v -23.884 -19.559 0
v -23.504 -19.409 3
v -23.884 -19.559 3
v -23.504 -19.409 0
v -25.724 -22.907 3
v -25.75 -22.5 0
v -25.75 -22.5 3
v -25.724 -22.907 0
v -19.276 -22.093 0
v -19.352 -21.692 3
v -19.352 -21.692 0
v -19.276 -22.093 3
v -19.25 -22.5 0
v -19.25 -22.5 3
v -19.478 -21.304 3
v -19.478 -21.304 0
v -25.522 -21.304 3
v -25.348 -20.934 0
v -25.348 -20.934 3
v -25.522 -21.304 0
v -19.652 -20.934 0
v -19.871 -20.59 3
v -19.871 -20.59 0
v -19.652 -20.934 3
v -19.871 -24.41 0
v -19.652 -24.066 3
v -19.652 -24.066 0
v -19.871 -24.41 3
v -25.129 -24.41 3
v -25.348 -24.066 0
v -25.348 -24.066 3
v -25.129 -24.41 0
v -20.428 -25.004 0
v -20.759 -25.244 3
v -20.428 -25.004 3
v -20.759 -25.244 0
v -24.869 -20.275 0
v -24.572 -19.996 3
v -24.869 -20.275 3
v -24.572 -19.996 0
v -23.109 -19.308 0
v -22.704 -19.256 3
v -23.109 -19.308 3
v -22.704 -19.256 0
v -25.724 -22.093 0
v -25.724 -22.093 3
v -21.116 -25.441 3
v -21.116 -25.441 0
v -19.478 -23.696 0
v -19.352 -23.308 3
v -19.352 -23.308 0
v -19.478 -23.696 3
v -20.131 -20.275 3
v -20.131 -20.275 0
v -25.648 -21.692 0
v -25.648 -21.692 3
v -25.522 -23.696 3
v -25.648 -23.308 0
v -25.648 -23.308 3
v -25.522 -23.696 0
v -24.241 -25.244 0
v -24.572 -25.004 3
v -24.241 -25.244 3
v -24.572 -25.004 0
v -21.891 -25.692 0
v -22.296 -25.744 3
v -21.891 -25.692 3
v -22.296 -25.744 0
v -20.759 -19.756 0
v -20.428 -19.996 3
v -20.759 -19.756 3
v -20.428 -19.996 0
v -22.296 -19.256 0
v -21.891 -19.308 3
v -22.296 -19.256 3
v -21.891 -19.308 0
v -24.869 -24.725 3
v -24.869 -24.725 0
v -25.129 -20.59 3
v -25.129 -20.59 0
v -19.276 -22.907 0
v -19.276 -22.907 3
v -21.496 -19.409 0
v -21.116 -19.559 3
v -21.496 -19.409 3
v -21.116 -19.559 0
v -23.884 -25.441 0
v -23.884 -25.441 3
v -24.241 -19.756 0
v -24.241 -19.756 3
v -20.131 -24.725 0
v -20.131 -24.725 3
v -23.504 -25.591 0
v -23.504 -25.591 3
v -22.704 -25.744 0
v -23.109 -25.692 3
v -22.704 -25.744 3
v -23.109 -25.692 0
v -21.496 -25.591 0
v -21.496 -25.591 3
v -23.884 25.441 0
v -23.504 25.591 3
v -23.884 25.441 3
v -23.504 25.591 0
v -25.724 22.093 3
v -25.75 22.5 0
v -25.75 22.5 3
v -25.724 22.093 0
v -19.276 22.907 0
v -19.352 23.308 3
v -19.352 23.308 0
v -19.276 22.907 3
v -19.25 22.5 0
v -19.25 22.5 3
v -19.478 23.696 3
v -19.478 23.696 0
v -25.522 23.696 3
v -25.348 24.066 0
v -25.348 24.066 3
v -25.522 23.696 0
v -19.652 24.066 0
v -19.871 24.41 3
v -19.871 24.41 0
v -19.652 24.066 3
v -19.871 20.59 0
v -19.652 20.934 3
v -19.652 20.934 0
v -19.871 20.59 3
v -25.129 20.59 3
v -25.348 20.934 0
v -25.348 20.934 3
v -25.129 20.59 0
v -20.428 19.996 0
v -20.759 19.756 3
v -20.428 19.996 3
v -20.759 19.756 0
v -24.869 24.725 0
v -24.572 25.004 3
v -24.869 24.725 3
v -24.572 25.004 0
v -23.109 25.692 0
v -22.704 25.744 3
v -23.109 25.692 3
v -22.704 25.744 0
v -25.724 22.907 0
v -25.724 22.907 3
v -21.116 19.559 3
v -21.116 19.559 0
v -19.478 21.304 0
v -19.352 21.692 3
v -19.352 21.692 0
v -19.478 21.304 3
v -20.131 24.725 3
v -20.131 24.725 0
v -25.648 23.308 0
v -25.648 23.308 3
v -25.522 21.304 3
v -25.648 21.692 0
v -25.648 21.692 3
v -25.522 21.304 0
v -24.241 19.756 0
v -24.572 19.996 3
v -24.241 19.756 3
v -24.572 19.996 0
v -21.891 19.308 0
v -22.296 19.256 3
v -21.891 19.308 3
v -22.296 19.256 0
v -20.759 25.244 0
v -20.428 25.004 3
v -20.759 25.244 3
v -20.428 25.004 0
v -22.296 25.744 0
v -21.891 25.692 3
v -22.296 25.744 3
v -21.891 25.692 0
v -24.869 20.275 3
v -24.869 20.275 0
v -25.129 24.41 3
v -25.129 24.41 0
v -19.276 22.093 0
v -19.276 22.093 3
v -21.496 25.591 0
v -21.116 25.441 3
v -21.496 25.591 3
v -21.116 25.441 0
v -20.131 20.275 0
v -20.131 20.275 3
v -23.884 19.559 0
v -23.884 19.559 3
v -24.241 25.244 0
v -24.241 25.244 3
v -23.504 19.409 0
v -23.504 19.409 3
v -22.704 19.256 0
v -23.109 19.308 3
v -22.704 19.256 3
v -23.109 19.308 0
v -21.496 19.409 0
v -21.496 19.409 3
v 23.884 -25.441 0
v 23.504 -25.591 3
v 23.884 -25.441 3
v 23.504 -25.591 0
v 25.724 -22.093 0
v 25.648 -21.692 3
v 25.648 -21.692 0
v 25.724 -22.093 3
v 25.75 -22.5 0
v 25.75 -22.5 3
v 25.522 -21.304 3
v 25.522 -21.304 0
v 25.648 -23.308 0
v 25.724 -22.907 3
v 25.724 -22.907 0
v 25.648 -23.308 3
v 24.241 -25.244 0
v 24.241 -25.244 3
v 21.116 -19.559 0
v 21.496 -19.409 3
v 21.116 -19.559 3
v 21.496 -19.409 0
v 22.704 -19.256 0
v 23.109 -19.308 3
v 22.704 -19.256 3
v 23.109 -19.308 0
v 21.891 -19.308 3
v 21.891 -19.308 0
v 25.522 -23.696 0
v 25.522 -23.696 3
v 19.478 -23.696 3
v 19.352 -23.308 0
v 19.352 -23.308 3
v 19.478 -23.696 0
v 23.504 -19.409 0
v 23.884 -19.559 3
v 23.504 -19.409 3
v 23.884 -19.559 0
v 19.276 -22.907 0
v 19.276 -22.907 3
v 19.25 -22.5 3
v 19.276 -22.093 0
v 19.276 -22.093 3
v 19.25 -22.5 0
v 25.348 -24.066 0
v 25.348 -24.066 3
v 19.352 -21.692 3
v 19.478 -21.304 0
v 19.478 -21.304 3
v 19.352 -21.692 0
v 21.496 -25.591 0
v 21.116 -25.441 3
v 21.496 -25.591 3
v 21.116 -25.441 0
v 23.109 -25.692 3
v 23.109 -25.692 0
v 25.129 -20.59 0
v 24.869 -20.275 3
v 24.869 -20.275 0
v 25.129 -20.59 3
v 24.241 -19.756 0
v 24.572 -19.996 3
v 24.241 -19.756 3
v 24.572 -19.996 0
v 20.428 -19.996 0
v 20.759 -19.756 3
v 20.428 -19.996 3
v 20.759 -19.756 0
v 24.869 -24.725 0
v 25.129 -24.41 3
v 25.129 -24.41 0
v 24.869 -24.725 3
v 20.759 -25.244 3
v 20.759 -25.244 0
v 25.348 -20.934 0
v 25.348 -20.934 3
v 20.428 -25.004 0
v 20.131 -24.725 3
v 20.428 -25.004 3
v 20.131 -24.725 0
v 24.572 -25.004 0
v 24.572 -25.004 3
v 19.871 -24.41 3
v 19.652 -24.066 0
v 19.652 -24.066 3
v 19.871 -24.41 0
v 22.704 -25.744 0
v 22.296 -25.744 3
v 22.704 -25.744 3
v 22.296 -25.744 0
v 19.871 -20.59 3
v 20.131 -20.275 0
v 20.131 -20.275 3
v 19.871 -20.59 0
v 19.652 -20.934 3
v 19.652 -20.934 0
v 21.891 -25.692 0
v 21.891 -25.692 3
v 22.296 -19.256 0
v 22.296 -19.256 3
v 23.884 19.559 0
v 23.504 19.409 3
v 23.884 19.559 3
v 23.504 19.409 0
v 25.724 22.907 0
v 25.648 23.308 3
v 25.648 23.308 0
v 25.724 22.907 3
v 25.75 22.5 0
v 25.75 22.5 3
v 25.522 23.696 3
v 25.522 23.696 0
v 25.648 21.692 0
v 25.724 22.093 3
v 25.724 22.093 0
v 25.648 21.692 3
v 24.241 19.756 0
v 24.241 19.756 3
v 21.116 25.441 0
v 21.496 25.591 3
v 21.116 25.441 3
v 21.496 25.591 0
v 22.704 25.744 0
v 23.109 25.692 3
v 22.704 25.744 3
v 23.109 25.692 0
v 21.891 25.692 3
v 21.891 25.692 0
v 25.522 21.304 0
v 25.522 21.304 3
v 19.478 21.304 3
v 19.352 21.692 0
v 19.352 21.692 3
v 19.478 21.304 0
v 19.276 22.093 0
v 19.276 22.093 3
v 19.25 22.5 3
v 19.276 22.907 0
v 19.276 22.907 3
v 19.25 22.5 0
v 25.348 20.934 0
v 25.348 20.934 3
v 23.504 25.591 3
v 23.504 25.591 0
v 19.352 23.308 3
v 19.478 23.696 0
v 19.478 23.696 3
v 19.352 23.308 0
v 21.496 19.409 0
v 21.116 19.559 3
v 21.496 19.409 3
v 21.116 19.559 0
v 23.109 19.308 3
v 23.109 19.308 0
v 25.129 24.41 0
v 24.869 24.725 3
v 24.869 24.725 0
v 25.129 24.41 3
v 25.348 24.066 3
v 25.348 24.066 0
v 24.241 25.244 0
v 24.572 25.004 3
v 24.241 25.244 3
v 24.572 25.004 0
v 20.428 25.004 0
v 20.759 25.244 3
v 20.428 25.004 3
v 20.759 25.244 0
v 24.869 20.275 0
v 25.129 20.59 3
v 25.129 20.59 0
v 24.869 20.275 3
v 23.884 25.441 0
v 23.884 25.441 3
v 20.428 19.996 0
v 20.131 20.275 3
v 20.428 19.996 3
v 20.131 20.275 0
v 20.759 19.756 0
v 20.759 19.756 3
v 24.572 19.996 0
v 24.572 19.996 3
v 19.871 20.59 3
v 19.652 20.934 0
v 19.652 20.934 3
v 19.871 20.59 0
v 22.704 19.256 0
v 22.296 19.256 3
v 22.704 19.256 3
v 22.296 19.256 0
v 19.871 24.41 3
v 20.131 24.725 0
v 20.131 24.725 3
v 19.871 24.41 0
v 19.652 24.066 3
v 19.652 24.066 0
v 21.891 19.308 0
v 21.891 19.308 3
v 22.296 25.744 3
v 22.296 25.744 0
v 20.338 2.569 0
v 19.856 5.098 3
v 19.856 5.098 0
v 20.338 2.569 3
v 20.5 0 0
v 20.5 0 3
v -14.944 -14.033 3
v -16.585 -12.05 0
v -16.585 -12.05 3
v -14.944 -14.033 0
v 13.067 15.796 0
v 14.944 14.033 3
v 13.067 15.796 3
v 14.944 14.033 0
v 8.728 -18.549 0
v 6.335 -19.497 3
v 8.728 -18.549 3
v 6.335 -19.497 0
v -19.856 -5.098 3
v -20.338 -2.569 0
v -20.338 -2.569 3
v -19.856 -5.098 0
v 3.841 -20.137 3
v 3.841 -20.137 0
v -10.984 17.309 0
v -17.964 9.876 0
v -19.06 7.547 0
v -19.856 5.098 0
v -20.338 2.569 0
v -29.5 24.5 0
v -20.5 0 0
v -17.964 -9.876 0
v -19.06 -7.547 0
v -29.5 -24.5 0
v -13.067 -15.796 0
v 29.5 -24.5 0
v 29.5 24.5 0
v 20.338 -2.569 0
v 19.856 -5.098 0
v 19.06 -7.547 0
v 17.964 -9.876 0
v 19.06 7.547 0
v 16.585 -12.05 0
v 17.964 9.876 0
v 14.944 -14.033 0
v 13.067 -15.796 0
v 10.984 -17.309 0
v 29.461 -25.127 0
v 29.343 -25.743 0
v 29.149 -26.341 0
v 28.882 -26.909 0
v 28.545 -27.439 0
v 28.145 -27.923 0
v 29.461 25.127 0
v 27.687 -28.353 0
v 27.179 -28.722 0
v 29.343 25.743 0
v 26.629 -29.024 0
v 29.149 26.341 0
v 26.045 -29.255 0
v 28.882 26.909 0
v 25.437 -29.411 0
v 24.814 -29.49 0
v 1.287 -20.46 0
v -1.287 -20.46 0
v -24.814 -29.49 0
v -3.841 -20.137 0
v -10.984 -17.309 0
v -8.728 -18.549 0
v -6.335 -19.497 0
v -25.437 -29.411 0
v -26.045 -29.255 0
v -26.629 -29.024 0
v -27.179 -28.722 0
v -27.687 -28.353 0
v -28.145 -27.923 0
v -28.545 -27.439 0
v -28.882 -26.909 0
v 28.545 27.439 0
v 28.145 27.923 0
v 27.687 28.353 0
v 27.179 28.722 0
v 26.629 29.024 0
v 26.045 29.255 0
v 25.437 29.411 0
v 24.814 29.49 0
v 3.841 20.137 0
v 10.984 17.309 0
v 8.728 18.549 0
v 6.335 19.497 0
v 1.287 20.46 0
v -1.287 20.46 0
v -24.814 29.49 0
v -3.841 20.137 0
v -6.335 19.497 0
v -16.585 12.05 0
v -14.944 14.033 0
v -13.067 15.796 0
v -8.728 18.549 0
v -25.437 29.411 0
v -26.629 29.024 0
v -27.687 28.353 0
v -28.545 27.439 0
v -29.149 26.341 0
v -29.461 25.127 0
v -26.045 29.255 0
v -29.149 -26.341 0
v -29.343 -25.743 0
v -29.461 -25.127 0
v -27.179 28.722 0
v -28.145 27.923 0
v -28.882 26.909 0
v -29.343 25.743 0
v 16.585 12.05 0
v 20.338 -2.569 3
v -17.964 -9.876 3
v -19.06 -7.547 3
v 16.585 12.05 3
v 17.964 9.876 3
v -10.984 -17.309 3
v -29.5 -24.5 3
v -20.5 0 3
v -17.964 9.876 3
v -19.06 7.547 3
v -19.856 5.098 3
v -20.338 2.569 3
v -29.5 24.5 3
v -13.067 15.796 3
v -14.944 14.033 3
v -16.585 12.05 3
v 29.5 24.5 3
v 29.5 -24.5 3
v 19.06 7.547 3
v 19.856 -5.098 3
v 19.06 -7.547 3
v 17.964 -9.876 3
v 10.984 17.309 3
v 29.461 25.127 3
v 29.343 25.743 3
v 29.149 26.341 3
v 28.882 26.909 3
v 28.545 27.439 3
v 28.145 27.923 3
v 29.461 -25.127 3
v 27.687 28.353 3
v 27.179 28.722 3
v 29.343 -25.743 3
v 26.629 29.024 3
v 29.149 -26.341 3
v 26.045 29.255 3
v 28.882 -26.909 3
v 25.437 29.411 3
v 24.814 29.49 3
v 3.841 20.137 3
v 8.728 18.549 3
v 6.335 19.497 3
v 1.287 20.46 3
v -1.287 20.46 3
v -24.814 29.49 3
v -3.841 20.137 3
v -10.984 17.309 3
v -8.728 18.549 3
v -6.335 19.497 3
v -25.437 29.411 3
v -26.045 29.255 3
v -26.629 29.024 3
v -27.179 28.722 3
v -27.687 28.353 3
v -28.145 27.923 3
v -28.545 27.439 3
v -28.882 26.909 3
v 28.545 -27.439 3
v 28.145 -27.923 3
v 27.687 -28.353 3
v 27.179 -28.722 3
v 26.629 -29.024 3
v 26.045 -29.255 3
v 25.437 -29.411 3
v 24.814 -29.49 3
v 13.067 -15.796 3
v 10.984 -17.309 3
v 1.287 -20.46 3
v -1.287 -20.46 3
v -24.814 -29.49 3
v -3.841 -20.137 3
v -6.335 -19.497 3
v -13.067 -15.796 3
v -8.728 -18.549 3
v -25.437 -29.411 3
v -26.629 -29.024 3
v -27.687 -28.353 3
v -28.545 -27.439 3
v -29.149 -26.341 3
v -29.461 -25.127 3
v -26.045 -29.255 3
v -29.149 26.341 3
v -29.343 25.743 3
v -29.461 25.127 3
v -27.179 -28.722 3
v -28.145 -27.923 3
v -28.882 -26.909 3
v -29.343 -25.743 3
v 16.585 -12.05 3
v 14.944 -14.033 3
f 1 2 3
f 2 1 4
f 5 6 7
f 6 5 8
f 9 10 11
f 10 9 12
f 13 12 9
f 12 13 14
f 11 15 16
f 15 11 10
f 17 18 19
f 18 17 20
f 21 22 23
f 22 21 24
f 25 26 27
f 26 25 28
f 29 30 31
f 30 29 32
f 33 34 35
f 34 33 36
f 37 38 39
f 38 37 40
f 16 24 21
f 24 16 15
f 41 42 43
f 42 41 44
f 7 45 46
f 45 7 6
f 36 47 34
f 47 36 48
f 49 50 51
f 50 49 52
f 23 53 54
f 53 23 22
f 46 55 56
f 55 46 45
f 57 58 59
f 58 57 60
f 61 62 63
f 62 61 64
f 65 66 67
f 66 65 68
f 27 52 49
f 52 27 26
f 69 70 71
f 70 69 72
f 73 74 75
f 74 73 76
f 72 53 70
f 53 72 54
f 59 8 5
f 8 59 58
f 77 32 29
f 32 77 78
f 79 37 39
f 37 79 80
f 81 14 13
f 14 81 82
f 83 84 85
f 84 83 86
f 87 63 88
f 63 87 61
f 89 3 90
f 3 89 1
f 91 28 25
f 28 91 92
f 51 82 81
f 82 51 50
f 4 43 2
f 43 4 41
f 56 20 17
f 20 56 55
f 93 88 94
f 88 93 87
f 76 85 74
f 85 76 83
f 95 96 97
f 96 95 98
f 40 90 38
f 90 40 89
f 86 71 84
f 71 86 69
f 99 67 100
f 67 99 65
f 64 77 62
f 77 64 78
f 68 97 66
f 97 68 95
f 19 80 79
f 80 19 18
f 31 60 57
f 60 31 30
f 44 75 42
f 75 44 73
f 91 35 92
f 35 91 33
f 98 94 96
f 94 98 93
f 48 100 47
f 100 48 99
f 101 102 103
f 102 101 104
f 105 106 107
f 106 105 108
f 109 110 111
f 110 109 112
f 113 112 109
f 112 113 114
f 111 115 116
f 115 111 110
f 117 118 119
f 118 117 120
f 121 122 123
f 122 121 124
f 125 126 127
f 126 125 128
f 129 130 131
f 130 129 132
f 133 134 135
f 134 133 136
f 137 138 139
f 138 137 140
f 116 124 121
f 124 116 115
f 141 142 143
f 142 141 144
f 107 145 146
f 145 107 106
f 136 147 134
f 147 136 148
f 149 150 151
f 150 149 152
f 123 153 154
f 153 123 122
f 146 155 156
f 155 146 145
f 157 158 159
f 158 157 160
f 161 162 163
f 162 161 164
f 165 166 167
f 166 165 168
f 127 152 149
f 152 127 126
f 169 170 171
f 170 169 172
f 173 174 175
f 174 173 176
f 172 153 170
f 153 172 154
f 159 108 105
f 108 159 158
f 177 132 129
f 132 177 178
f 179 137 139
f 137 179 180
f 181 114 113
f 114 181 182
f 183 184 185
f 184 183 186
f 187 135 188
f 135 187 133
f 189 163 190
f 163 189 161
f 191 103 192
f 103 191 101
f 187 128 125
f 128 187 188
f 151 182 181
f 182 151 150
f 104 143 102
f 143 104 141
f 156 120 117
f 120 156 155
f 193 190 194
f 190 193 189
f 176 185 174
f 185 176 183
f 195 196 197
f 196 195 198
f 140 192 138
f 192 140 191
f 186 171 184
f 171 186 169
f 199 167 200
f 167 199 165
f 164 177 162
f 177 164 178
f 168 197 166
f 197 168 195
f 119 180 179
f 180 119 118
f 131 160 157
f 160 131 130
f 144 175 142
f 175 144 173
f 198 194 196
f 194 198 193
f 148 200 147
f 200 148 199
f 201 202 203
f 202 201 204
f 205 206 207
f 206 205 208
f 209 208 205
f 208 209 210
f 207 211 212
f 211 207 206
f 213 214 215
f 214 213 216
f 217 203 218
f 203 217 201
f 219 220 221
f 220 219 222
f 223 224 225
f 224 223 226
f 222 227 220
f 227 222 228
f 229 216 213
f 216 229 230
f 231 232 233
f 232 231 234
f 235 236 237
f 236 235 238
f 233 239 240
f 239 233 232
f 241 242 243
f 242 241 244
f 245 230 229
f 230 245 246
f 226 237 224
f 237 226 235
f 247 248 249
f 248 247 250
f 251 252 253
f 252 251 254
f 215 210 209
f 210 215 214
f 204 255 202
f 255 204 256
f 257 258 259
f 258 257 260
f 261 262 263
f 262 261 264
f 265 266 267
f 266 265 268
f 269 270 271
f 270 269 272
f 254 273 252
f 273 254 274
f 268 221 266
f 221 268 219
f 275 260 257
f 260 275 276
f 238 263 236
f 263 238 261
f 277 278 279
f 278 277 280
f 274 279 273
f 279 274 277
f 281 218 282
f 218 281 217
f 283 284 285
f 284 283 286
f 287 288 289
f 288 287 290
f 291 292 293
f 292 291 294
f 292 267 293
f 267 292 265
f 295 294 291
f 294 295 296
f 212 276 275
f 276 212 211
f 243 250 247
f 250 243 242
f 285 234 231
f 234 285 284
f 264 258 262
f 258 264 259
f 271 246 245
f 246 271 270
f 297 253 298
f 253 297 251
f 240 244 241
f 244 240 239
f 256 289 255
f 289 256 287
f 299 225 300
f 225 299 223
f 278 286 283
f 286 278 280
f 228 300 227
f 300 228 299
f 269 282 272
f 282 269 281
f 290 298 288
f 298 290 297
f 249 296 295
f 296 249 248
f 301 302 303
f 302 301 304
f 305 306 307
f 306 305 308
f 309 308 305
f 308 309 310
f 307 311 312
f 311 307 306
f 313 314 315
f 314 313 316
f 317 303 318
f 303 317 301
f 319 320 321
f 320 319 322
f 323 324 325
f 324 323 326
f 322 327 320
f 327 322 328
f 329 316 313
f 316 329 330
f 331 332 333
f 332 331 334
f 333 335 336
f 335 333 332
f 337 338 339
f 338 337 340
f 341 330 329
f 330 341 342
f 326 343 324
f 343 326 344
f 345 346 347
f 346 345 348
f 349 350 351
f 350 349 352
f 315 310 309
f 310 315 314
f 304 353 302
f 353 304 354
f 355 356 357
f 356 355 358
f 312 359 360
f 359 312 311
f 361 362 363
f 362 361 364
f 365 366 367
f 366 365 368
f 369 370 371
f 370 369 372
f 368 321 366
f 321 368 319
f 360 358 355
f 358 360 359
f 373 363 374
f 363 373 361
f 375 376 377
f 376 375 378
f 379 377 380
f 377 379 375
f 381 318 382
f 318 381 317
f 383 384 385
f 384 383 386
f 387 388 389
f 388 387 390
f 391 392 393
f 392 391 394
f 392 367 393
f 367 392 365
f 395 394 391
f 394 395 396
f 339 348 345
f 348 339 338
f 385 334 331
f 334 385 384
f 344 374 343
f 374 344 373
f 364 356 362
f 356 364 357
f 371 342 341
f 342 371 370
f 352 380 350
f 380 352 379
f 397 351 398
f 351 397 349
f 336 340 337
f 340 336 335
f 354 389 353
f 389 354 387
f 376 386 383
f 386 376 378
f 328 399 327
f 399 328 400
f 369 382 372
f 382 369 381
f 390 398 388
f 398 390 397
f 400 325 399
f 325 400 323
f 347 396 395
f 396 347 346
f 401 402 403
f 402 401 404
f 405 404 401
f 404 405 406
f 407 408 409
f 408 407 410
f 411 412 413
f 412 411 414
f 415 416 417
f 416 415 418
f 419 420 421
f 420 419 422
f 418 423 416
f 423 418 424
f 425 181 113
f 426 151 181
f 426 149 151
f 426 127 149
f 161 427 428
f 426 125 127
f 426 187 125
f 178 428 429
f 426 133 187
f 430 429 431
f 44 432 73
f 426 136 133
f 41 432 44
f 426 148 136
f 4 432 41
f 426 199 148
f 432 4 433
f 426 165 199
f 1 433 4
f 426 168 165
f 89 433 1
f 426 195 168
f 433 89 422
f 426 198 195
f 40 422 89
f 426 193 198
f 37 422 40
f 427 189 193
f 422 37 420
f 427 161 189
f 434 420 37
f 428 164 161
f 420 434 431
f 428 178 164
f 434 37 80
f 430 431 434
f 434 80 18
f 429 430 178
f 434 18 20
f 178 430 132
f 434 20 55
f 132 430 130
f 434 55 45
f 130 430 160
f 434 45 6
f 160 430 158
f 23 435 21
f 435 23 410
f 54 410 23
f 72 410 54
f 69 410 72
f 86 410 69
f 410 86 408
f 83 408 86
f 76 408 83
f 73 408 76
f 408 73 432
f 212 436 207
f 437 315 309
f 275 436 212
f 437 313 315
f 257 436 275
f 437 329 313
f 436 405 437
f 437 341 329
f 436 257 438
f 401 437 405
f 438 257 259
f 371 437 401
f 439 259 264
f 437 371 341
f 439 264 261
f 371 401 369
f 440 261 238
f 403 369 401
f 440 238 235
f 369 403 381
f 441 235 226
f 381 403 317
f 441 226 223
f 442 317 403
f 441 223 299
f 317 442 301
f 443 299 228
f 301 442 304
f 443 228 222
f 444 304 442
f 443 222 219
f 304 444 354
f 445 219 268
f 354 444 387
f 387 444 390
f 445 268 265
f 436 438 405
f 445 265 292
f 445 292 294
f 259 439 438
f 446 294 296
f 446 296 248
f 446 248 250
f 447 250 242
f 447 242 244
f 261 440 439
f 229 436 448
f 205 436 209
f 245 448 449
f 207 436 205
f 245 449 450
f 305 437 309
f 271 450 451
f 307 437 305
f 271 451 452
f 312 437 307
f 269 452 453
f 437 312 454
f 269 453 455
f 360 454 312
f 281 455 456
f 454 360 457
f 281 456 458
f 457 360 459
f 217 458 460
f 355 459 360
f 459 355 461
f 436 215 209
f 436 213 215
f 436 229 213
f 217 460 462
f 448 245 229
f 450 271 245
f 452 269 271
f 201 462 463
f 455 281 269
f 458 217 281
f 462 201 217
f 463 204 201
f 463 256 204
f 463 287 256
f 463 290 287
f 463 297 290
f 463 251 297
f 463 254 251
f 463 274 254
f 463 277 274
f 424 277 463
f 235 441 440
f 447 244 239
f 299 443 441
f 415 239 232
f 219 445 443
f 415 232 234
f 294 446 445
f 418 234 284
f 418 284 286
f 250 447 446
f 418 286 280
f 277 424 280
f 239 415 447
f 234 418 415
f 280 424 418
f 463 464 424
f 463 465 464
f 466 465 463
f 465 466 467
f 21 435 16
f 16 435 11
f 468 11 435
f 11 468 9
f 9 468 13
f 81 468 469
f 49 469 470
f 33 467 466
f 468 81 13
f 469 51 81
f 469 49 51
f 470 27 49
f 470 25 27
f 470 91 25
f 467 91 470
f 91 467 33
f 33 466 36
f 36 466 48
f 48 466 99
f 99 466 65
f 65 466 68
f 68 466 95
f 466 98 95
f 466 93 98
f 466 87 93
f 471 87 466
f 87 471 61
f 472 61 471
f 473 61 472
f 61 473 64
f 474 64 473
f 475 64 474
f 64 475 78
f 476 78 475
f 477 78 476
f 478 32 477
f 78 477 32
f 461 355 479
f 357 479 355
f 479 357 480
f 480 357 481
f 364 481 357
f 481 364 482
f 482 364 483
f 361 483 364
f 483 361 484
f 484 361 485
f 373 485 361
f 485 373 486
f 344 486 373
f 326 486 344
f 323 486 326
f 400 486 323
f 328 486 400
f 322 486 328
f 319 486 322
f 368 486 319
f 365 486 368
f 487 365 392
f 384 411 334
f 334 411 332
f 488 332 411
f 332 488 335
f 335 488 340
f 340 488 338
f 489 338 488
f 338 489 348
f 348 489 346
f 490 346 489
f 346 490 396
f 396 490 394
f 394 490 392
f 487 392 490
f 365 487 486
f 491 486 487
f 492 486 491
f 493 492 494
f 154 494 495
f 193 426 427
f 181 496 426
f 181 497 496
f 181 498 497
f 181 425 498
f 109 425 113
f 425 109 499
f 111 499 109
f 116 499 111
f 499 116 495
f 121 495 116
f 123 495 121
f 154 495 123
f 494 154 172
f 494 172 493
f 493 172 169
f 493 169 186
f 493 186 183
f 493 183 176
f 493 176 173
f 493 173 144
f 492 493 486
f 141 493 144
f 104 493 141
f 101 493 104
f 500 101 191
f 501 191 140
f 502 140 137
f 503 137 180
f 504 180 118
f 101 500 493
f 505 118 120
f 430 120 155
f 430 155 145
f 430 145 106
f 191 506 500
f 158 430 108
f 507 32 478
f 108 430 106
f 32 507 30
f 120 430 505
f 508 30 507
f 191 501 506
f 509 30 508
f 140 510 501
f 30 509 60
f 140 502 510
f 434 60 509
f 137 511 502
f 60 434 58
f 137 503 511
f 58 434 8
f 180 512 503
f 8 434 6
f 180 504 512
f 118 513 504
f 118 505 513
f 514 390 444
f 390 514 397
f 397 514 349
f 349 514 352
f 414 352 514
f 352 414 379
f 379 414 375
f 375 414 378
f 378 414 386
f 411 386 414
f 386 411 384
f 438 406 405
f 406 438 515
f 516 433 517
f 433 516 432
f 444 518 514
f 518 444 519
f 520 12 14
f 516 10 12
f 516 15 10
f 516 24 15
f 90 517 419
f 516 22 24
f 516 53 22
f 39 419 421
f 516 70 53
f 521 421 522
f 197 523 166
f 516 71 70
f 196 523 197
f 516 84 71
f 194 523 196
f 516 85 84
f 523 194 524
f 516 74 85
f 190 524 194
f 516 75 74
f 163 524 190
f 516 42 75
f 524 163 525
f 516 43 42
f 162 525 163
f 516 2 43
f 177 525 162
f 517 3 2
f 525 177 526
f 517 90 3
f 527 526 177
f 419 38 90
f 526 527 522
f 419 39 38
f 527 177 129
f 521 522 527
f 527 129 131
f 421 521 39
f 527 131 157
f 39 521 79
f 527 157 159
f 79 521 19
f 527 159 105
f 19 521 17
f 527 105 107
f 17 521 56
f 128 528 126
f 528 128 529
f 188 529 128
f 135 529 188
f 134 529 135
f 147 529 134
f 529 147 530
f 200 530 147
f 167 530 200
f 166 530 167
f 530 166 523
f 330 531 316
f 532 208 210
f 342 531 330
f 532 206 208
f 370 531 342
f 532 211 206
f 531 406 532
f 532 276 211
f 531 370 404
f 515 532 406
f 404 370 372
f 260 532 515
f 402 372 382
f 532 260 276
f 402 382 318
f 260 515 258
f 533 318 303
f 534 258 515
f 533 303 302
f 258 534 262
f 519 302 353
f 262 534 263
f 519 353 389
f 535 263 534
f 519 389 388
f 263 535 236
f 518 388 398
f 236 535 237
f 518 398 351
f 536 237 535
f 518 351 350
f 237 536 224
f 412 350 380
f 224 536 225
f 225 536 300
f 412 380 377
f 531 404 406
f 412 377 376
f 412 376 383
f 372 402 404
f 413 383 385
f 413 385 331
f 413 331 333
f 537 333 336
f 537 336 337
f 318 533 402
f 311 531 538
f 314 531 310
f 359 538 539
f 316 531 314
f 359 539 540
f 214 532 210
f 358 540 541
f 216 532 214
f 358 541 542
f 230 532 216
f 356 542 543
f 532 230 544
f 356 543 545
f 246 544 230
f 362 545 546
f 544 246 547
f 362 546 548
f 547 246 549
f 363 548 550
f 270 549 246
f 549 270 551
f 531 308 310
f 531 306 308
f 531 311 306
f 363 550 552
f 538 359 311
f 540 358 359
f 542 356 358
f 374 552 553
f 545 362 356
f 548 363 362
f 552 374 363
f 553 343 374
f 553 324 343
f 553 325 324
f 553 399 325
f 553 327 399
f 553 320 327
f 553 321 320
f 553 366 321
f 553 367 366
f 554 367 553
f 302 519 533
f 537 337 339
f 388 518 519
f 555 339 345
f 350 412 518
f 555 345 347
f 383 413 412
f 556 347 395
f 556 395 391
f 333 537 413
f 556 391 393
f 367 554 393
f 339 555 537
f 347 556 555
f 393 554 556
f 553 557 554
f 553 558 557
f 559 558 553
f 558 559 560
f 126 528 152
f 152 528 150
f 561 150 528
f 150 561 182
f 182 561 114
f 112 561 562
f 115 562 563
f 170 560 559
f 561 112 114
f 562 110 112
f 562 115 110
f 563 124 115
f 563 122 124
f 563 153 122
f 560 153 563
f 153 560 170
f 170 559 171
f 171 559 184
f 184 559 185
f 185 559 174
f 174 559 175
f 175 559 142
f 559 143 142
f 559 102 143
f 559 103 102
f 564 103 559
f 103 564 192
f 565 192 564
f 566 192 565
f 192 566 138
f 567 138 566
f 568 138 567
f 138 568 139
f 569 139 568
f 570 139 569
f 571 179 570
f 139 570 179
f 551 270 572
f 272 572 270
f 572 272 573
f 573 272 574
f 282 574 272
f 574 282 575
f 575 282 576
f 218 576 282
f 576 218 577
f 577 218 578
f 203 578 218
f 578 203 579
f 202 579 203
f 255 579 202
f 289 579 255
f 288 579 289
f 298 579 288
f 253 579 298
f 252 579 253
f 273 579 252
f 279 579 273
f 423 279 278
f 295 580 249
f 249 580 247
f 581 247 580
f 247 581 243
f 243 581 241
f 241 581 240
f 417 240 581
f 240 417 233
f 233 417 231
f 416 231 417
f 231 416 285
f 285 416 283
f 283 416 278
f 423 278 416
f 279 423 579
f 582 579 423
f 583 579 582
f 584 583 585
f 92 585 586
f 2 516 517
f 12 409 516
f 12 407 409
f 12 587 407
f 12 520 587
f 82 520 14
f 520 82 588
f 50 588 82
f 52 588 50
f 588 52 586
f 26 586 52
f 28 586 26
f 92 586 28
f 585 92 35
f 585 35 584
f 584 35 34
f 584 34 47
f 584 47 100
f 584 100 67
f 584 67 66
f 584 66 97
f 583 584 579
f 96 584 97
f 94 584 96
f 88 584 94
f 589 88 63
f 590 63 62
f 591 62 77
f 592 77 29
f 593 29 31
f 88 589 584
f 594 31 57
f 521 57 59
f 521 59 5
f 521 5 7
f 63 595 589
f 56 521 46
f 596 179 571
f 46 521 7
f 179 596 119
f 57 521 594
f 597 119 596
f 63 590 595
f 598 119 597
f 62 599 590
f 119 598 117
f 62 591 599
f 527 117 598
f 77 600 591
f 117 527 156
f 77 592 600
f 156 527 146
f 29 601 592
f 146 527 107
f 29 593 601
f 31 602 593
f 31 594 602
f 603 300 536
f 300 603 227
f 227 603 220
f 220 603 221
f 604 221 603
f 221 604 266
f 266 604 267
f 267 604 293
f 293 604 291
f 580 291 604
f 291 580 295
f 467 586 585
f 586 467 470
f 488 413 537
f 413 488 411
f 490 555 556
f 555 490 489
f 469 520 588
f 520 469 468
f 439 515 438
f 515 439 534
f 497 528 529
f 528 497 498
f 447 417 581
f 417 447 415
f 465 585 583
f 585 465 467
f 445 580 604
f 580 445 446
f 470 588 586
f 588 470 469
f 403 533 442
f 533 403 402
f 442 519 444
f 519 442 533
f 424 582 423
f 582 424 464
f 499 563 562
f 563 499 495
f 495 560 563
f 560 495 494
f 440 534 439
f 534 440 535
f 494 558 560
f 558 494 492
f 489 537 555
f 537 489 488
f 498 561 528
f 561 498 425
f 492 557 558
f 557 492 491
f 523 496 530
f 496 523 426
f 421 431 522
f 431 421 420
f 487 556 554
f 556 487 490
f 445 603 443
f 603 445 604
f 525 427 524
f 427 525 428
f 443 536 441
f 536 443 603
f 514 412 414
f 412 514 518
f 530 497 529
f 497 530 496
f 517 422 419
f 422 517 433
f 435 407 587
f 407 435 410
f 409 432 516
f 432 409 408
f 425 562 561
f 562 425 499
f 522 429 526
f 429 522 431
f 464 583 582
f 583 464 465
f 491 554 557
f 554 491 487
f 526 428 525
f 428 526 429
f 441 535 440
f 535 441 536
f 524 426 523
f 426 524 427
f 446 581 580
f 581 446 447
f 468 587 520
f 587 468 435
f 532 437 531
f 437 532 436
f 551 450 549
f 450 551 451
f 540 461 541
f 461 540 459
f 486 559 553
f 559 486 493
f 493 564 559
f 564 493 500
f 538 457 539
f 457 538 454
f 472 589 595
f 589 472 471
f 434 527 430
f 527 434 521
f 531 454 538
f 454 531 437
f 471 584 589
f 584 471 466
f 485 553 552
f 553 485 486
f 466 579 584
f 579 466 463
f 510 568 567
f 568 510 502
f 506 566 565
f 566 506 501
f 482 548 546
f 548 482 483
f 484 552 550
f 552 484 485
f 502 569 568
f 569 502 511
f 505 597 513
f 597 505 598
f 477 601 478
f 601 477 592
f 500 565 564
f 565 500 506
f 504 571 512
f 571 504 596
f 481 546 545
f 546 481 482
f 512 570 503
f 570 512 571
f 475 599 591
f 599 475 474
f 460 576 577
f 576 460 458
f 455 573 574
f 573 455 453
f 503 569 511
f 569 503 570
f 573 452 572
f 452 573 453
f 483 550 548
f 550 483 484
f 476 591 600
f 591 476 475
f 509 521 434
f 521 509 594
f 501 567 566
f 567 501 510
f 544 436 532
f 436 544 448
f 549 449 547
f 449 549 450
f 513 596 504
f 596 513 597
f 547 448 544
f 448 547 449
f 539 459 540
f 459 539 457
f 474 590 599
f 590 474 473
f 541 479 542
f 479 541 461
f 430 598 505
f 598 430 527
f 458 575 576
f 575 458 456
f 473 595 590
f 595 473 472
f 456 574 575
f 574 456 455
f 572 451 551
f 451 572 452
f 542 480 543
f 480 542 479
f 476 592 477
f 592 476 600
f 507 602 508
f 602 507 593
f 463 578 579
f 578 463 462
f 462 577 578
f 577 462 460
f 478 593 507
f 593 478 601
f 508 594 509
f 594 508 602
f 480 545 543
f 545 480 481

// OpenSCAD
$fn = 50;

difference() {
	union() {
		hull() {
			translate(v = [-24.5, 24.5, 0]) {
				cylinder(h = 3, r = 5);
			}
			translate(v = [24.5, 24.5, 0]) {
				cylinder(h = 3, r = 5);
			}
			translate(v = [-24.5, -24.5, 0]) {
				cylinder(h = 3, r = 5);
			}
			translate(v = [24.5, -24.5, 0]) {
				cylinder(h = 3, r = 5);
			}
		}
	}
	union() {
		translate(v = [-22.5, -22.5, -100.0]) {
			cylinder(h = 200, r = 3.25);
		}
		translate(v = [-22.5, 22.5, -100.0]) {
			cylinder(h = 200, r = 3.25);
		}
		translate(v = [22.5, -22.5, -100.0]) {
			cylinder(h = 200, r = 3.25);
		}
		translate(v = [22.5, 22.5, -100.0]) {
			cylinder(h = 200, r = 3.25);
		}
		translate(v = [-22.5, -22.5, -100.0]) {
			cylinder(h = 200, r = 1.8);
		}
		translate(v = [-22.5, 22.5, -100.0]) {
			cylinder(h = 200, r = 1.8);
		}
		translate(v = [22.5, -22.5, -100.0]) {
			cylinder(h = 200, r = 1.8);
		}
		translate(v = [22.5, 22.5, -100.0]) {
			cylinder(h = 200, r = 1.8);
		}
		cylinder(h = 3, r = 20.5);
	}
}
